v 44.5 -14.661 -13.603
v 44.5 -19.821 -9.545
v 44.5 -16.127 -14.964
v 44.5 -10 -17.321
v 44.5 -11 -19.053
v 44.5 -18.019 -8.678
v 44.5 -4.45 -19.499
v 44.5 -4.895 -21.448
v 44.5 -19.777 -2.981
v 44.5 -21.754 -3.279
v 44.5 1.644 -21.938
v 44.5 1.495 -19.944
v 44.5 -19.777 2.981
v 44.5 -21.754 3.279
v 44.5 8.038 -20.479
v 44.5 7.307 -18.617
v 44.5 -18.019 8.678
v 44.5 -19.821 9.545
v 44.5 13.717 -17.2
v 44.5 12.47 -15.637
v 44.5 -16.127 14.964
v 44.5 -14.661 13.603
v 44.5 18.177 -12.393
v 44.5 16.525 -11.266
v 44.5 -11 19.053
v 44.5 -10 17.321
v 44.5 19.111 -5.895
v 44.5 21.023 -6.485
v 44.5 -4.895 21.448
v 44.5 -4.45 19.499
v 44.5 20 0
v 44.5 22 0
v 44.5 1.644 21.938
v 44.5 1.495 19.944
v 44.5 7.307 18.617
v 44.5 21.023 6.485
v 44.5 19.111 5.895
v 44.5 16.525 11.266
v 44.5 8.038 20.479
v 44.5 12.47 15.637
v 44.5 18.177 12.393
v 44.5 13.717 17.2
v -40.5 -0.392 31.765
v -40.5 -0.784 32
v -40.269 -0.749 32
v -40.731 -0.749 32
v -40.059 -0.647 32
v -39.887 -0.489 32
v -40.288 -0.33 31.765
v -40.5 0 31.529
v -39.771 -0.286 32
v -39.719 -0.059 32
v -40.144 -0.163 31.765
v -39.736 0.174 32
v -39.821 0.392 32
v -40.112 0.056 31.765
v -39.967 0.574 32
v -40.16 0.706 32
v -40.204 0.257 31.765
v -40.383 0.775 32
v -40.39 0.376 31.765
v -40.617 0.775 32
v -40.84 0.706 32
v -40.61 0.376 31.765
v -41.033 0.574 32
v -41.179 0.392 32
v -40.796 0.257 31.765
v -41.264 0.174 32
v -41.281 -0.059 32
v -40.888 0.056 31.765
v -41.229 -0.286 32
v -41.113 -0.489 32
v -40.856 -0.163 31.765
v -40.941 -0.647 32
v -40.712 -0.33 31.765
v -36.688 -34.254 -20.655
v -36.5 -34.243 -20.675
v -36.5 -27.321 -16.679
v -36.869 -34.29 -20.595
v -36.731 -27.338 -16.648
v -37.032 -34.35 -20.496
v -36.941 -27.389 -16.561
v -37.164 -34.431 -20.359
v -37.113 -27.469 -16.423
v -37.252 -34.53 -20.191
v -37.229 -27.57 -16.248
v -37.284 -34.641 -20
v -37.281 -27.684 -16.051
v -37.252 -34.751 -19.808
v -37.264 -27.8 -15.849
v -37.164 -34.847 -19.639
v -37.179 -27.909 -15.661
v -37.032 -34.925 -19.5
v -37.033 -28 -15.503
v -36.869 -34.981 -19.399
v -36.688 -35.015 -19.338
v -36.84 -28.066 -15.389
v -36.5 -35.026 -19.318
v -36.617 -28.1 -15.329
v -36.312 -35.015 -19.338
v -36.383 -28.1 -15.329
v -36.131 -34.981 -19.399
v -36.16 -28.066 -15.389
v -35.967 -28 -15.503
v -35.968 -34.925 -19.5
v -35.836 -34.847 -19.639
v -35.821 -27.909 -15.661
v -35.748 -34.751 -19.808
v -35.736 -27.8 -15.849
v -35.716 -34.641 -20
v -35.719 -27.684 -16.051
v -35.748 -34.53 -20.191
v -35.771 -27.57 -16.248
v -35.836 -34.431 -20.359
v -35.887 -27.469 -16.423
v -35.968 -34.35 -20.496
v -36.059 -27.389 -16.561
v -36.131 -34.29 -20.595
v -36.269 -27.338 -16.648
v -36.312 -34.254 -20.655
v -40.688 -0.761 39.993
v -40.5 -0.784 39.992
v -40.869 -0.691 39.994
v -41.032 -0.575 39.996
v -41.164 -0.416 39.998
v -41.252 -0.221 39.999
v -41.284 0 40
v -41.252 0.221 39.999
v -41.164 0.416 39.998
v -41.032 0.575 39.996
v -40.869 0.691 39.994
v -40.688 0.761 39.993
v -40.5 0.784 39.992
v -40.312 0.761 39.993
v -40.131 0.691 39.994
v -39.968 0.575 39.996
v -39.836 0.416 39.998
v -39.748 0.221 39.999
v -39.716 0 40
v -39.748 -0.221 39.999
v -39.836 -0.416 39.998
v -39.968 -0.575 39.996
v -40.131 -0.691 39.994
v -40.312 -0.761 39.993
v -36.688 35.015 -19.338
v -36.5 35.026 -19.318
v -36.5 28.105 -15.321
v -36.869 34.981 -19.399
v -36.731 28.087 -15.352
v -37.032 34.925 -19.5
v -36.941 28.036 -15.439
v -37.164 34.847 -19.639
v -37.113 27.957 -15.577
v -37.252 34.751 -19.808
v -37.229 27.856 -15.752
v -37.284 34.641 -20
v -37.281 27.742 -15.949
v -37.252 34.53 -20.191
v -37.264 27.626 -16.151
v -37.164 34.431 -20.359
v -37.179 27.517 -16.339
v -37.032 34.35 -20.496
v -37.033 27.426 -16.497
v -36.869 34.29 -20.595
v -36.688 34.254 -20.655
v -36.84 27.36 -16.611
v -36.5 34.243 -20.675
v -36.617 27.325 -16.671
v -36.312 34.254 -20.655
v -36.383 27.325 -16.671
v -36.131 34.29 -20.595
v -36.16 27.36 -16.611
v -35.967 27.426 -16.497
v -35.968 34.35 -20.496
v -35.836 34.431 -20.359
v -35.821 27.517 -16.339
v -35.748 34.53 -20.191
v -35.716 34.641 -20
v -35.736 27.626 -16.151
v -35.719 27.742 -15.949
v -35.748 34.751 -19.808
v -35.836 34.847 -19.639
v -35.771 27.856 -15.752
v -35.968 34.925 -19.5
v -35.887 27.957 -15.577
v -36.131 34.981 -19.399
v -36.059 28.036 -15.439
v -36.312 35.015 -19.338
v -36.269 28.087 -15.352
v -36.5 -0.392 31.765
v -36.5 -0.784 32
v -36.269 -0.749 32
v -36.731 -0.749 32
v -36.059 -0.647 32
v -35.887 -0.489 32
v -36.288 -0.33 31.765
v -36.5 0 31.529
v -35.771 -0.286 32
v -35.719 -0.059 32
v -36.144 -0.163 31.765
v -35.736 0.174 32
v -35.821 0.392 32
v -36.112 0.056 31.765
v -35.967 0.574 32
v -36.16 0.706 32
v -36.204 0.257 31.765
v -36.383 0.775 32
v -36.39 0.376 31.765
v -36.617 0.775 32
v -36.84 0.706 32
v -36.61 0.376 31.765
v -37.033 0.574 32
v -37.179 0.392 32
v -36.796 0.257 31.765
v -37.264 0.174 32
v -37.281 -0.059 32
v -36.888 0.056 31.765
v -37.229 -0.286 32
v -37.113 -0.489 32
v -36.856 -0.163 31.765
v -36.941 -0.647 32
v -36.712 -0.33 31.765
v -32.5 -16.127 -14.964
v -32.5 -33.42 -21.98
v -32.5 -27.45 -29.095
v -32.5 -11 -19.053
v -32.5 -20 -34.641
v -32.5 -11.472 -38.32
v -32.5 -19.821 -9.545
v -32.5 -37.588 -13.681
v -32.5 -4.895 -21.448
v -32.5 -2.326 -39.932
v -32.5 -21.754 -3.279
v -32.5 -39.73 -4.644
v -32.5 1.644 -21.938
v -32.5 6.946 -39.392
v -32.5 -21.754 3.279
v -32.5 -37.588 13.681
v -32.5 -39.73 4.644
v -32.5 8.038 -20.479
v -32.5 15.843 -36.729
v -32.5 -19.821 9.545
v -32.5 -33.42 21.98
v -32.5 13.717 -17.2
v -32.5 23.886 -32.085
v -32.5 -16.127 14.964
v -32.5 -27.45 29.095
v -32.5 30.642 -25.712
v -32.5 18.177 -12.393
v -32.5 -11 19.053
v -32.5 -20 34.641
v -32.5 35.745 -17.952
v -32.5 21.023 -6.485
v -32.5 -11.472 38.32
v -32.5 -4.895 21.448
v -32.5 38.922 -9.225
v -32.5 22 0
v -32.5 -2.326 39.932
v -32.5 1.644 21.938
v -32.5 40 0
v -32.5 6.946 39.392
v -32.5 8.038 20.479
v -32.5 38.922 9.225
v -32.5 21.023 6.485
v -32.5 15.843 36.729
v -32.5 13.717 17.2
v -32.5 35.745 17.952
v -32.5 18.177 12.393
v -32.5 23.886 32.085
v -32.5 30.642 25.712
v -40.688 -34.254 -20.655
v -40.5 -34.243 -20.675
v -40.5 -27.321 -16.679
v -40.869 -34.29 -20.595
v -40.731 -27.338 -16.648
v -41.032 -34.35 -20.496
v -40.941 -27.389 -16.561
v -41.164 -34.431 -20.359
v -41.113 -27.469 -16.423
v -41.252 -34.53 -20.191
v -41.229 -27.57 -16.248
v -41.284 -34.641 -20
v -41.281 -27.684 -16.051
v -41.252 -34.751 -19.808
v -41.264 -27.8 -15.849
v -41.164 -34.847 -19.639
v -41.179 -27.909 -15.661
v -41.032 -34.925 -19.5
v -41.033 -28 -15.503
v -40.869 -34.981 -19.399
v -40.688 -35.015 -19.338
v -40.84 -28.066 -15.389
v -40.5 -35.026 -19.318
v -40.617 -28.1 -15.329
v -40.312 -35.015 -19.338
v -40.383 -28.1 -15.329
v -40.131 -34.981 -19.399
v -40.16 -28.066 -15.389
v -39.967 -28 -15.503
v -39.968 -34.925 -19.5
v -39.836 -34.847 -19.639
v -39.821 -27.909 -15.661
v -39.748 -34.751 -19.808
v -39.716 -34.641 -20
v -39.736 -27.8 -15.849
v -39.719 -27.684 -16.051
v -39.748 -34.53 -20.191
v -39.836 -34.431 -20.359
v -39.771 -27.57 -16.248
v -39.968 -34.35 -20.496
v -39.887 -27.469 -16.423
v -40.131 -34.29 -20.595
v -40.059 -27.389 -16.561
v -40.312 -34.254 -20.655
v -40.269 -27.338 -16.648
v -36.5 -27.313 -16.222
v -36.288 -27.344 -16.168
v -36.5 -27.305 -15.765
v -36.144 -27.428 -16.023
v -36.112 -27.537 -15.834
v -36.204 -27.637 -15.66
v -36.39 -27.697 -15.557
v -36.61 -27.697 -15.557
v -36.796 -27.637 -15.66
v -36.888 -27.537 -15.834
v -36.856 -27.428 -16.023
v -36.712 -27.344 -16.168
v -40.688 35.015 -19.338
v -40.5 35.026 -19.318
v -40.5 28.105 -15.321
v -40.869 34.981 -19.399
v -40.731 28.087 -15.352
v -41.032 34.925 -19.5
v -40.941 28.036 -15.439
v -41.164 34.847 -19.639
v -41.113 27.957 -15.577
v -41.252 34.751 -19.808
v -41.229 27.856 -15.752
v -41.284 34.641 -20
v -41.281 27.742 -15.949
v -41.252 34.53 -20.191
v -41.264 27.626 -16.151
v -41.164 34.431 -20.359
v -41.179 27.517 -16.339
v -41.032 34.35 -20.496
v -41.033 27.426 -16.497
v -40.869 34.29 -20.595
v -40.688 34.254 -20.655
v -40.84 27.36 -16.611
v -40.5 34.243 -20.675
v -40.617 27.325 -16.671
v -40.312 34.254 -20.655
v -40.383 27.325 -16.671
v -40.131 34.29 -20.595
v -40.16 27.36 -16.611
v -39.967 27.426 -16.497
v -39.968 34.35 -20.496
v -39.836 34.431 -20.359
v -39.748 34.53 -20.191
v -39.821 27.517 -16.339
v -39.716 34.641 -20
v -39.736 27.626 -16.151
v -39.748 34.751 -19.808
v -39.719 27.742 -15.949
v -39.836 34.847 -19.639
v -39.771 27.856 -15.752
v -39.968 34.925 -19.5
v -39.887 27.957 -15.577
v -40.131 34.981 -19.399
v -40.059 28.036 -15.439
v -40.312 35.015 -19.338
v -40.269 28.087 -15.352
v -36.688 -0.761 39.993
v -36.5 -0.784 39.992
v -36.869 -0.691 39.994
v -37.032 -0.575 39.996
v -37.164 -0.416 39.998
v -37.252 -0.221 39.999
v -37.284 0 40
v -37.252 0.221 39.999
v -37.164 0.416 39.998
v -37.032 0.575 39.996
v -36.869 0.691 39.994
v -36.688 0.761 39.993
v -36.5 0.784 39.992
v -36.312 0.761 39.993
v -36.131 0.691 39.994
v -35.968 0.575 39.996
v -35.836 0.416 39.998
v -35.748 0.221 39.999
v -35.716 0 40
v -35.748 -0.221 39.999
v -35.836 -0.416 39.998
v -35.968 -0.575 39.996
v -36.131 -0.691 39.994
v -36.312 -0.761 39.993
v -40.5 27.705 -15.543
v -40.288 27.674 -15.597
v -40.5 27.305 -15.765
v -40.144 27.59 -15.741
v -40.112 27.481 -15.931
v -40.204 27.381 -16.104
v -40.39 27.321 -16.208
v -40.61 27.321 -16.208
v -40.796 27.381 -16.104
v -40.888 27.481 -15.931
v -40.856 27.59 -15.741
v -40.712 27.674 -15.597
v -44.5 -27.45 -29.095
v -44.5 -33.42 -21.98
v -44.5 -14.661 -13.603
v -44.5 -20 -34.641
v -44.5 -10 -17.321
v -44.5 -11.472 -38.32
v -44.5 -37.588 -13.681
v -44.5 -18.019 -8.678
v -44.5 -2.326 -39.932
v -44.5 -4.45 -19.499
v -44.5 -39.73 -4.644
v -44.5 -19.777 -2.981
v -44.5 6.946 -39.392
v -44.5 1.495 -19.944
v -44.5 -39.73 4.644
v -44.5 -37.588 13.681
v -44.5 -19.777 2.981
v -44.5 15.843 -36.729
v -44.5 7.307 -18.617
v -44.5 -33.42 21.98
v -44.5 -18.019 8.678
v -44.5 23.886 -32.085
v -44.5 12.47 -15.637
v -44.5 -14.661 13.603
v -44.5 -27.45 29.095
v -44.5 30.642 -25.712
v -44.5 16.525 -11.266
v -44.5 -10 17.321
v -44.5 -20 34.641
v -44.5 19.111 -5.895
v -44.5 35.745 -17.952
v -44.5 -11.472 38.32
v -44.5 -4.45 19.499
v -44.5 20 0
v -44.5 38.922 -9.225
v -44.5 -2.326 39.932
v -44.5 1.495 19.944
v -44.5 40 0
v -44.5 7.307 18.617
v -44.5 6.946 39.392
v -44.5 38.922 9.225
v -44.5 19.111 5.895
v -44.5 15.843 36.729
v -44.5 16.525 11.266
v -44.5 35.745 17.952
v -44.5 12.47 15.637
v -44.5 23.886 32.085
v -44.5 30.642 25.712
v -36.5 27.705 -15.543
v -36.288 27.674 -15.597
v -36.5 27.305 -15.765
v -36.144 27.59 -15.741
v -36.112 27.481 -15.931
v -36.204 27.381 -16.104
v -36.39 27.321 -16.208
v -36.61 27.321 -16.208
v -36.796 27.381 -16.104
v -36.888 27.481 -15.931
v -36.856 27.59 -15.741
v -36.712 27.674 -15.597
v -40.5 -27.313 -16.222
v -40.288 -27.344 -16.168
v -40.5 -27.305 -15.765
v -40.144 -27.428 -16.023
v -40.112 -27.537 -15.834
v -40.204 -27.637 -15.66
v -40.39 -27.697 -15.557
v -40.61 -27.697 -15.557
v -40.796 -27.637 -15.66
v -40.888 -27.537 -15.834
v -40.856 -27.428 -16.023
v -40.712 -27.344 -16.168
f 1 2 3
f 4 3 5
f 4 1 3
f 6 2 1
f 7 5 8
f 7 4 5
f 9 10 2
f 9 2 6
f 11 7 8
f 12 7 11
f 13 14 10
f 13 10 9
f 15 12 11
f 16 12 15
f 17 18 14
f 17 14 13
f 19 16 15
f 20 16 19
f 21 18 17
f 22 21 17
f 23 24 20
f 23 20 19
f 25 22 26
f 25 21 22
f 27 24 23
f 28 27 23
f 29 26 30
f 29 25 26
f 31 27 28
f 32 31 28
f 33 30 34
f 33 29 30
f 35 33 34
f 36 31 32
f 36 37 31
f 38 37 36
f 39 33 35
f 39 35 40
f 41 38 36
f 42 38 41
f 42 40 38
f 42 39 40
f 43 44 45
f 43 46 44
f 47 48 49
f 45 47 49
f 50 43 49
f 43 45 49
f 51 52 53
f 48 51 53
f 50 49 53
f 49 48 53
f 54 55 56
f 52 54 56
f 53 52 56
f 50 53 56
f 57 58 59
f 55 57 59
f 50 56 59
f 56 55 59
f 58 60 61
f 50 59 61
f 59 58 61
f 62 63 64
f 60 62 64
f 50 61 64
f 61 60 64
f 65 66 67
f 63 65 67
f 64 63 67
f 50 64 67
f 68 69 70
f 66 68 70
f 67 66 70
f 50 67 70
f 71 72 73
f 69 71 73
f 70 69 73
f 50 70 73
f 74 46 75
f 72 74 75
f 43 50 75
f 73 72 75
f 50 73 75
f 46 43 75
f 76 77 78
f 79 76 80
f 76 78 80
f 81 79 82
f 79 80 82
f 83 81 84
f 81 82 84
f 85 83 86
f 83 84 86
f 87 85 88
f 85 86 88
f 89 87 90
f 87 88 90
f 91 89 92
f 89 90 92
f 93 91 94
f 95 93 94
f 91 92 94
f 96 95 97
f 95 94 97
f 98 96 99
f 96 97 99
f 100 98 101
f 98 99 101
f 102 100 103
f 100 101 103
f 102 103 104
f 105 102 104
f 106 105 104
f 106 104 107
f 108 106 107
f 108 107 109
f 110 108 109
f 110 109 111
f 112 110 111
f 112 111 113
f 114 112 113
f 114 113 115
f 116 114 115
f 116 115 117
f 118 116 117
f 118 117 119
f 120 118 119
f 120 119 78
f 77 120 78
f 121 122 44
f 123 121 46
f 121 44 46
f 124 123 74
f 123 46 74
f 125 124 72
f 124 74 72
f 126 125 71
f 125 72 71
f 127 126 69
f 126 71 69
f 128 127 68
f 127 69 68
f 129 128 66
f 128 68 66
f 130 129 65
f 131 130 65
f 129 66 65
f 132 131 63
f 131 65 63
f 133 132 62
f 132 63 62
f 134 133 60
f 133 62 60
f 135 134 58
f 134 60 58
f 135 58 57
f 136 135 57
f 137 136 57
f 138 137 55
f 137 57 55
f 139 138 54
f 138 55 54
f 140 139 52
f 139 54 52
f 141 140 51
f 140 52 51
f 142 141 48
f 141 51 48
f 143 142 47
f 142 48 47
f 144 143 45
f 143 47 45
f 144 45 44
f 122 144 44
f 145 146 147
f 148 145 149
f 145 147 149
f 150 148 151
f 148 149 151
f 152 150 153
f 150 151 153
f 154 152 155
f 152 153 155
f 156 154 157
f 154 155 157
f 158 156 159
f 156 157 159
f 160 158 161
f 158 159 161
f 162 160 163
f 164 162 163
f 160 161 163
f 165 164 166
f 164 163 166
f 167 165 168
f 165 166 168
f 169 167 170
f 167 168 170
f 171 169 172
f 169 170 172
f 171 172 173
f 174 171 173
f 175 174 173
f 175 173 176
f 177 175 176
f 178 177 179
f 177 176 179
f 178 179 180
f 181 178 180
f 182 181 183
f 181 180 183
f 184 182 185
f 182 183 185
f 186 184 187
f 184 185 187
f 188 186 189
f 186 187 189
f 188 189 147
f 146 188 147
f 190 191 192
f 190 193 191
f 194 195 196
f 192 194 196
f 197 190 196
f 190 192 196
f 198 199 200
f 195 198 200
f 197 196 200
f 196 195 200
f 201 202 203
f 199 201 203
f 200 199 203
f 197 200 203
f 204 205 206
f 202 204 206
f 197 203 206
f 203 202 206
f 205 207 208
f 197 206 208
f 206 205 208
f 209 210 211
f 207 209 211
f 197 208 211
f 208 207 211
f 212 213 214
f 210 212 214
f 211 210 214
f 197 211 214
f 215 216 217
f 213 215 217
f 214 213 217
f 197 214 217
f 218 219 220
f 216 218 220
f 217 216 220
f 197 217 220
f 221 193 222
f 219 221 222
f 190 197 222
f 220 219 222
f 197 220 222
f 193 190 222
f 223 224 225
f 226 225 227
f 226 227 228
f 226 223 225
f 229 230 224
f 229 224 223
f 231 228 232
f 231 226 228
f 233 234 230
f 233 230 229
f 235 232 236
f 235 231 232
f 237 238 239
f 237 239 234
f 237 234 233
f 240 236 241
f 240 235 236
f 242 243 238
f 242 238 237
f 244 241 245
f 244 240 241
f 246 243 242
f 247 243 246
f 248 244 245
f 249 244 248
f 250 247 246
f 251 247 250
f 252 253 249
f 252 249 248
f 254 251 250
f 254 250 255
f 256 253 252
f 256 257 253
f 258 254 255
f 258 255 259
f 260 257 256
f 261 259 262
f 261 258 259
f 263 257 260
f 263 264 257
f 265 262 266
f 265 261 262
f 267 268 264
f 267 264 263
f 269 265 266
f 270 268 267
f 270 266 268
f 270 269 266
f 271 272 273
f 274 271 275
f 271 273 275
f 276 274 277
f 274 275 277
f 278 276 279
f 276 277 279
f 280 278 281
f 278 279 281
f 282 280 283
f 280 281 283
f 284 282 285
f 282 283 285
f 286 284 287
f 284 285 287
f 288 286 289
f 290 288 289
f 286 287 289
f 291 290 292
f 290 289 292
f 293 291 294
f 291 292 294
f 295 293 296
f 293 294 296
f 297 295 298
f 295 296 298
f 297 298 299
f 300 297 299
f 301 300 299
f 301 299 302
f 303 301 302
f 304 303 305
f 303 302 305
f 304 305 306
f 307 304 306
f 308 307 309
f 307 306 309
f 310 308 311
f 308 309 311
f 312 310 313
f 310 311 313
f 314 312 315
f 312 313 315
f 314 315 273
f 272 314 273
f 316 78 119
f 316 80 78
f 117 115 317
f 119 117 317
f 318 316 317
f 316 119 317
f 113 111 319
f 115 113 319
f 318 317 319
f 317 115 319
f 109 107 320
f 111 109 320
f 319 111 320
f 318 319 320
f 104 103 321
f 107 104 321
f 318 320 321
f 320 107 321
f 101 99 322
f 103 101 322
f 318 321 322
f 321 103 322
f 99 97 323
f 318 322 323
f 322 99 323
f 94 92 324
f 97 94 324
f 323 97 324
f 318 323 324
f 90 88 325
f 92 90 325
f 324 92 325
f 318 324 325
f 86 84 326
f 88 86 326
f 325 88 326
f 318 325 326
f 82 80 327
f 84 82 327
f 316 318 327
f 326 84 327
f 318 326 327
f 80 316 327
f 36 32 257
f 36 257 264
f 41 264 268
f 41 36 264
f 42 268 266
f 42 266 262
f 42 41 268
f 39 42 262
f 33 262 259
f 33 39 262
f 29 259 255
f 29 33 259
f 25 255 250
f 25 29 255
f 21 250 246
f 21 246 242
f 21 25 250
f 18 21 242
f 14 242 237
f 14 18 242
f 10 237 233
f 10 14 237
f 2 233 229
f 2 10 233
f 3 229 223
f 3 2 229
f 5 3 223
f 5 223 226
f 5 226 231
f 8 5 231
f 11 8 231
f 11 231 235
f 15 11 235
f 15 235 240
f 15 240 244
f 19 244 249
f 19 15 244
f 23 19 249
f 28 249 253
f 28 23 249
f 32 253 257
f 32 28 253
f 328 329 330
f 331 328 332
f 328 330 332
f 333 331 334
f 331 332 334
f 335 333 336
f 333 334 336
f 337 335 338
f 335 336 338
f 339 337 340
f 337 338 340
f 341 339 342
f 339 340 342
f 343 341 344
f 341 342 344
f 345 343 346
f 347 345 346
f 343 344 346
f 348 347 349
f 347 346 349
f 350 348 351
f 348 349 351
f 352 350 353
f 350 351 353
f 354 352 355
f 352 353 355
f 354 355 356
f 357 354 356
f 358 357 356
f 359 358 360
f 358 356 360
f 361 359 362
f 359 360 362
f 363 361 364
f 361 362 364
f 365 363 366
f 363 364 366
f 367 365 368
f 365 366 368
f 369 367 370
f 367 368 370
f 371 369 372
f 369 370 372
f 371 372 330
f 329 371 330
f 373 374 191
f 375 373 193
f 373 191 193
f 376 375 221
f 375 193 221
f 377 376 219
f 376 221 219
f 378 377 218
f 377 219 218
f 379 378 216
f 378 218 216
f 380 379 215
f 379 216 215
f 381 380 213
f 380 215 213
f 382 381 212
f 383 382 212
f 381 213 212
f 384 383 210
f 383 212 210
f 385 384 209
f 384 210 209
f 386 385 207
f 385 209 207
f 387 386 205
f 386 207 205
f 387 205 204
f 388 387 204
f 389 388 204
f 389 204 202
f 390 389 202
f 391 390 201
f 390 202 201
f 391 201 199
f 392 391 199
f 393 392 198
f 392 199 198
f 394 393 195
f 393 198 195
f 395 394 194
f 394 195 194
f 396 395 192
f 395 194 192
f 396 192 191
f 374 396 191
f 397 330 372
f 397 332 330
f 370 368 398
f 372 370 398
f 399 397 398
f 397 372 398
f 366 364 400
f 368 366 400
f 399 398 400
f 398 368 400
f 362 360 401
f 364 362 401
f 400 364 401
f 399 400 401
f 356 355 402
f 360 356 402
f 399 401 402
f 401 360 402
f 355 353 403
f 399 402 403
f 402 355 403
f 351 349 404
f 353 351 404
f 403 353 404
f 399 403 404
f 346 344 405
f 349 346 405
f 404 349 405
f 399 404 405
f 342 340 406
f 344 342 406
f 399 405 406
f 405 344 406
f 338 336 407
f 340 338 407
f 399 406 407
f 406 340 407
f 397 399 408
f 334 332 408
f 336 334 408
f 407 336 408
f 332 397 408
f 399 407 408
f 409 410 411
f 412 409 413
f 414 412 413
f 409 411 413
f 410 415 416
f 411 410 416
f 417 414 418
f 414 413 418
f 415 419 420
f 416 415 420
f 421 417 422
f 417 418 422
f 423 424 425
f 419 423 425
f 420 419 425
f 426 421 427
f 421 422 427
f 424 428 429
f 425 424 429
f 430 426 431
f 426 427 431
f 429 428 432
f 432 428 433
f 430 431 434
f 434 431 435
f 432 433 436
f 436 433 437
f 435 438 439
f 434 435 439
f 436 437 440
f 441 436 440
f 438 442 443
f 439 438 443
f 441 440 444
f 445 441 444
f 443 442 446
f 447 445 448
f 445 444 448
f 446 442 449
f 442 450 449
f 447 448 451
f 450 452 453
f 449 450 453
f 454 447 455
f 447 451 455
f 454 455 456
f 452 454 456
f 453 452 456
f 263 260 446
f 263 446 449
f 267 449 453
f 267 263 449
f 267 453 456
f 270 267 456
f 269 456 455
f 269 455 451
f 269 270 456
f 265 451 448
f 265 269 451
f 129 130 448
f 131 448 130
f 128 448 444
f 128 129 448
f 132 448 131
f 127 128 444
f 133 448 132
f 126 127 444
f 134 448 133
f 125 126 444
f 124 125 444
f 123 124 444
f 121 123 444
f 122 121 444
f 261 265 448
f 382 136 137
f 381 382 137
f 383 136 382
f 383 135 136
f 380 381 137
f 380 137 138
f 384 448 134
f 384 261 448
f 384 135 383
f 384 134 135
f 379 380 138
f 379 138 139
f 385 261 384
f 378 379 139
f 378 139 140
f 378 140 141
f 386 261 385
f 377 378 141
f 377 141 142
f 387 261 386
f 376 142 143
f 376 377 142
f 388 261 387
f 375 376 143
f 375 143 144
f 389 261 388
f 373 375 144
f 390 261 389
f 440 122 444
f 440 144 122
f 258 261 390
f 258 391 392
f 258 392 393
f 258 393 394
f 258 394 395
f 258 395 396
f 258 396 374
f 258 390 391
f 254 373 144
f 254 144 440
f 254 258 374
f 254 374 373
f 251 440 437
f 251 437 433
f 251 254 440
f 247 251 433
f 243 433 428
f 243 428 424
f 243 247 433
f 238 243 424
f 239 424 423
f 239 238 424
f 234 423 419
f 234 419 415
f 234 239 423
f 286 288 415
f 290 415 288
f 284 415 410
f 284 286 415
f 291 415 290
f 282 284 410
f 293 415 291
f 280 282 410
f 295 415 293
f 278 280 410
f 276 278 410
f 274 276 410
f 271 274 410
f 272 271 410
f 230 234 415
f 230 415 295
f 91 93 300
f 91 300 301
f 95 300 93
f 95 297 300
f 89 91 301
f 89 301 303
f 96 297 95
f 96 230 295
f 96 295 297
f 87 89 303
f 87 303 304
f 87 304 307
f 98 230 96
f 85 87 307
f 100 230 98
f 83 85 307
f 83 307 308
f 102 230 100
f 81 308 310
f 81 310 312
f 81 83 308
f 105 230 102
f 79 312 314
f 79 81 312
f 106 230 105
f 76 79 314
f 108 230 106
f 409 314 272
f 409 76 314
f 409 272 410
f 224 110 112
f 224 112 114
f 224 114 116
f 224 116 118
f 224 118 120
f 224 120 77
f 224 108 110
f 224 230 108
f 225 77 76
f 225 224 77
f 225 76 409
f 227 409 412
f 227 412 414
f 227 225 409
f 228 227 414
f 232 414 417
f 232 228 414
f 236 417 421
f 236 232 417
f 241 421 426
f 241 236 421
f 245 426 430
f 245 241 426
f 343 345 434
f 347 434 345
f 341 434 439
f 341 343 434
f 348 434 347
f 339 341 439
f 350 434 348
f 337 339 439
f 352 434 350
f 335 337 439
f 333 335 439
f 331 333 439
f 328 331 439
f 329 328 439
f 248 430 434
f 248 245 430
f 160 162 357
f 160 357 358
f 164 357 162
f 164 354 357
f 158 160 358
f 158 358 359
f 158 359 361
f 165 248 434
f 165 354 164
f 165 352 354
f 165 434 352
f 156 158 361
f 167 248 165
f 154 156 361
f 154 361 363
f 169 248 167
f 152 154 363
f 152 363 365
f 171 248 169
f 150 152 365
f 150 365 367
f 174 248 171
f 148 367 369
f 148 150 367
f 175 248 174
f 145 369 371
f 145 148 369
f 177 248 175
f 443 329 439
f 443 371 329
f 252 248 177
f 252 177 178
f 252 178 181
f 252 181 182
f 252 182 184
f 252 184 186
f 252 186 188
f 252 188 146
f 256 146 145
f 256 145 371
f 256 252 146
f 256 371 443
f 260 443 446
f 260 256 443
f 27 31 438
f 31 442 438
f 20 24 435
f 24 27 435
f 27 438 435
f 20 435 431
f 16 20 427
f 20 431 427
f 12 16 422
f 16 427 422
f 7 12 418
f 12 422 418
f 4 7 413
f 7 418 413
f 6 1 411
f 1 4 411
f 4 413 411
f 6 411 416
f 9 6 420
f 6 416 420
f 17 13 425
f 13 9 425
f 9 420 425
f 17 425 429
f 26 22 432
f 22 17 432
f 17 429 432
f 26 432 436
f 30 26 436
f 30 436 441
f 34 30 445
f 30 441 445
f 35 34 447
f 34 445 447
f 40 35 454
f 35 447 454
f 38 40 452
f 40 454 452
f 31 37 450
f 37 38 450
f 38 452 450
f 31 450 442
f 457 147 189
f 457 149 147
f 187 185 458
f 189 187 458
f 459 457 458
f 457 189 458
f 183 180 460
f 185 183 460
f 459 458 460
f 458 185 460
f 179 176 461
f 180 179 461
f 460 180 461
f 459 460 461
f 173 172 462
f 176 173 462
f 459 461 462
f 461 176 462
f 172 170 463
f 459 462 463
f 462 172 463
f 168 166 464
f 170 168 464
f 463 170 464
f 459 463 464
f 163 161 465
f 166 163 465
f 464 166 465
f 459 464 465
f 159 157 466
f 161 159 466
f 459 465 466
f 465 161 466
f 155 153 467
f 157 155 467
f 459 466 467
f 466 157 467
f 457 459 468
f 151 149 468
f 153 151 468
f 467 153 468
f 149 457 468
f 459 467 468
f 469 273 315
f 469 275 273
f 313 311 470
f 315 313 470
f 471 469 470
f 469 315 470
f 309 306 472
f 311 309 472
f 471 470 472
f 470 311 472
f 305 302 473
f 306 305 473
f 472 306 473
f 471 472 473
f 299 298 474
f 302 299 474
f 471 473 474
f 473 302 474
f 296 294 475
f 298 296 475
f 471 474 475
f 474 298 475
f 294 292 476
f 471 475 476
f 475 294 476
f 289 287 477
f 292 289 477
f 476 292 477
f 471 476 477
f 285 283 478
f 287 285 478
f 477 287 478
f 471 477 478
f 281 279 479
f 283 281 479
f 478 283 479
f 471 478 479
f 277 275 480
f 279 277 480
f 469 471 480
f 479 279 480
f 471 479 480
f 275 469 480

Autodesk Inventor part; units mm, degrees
ref_plane "YZ Plane" through (0, 0, 0) normal (1, 0, 0) x (0, 1, 0)
ref_plane "XZ Plane" through (0, 0, 0) normal (0, 1, 0) x (-1, 0, 0)
sketch "Sketch1" plane through (0, 0, 0) normal (0, 0, 1) x (1, 0, 0)
  line L0 (-44.5, 40) -> (-32.5, 40)
  line L1 (-32.5, 40) -> (-32.5, 22)
  line L2 (-32.5, 22) -> (44.5, 22)
  line L3 (44.5, 22) -> (44.5, 20)
  line L4 (44.5, 20) -> (-44.5, 20)
  line L5 (-44.5, 20) -> (-44.5, 40)
  line L6 (-62.3, 0) -> (62.3, 0) projected
  point P0 (0, 0)
  point P1 (0, 20)
  dimension "d0" = 12
  dimension "d1" = 89
  dimension "d2" = 40
  dimension "d3" = 44
  dimension "d4" = 80
revolve "Revolution1" add sketch "Sketch1" angle 360 about axis through (-10, 0, 0) along (1, 0, 0)
ref_plane "Work Plane1" through (-38.5, 0, 40) normal (0, 0, 1) x (1, 0, 0)
sketch "Sketch2" plane through (-38.5, 0, 40) normal (0, 0, 1) x (1, 0, 0)
  line L0 (-2, 0) -> (2, 0) construction
  line L1 (-6, -40) -> (-6, 40) projected
  line L2 (6, -40) -> (6, 40) projected
  line L3 (-6, 0) -> (6, 0) construction
  point P0 (38.5, 0)
  point P1 (0, 0)
  dimension "d6" = 4
hole "Hole1" at (-40.5, 0, 40) at (-36.5, 0, 40) direction (0, 0, -1) diameter 1.567 depth 8 tip angle 118 thread size "M2x0.4" class "6H" standard "ISO Metric profile"
pattern_circular "Circular Pattern1" count 3 over 360 about axis through (0, 0, 0) along (1, 0, 0) of "Hole1"
properties part number "ALPHA_001157_EndNosePiece"
